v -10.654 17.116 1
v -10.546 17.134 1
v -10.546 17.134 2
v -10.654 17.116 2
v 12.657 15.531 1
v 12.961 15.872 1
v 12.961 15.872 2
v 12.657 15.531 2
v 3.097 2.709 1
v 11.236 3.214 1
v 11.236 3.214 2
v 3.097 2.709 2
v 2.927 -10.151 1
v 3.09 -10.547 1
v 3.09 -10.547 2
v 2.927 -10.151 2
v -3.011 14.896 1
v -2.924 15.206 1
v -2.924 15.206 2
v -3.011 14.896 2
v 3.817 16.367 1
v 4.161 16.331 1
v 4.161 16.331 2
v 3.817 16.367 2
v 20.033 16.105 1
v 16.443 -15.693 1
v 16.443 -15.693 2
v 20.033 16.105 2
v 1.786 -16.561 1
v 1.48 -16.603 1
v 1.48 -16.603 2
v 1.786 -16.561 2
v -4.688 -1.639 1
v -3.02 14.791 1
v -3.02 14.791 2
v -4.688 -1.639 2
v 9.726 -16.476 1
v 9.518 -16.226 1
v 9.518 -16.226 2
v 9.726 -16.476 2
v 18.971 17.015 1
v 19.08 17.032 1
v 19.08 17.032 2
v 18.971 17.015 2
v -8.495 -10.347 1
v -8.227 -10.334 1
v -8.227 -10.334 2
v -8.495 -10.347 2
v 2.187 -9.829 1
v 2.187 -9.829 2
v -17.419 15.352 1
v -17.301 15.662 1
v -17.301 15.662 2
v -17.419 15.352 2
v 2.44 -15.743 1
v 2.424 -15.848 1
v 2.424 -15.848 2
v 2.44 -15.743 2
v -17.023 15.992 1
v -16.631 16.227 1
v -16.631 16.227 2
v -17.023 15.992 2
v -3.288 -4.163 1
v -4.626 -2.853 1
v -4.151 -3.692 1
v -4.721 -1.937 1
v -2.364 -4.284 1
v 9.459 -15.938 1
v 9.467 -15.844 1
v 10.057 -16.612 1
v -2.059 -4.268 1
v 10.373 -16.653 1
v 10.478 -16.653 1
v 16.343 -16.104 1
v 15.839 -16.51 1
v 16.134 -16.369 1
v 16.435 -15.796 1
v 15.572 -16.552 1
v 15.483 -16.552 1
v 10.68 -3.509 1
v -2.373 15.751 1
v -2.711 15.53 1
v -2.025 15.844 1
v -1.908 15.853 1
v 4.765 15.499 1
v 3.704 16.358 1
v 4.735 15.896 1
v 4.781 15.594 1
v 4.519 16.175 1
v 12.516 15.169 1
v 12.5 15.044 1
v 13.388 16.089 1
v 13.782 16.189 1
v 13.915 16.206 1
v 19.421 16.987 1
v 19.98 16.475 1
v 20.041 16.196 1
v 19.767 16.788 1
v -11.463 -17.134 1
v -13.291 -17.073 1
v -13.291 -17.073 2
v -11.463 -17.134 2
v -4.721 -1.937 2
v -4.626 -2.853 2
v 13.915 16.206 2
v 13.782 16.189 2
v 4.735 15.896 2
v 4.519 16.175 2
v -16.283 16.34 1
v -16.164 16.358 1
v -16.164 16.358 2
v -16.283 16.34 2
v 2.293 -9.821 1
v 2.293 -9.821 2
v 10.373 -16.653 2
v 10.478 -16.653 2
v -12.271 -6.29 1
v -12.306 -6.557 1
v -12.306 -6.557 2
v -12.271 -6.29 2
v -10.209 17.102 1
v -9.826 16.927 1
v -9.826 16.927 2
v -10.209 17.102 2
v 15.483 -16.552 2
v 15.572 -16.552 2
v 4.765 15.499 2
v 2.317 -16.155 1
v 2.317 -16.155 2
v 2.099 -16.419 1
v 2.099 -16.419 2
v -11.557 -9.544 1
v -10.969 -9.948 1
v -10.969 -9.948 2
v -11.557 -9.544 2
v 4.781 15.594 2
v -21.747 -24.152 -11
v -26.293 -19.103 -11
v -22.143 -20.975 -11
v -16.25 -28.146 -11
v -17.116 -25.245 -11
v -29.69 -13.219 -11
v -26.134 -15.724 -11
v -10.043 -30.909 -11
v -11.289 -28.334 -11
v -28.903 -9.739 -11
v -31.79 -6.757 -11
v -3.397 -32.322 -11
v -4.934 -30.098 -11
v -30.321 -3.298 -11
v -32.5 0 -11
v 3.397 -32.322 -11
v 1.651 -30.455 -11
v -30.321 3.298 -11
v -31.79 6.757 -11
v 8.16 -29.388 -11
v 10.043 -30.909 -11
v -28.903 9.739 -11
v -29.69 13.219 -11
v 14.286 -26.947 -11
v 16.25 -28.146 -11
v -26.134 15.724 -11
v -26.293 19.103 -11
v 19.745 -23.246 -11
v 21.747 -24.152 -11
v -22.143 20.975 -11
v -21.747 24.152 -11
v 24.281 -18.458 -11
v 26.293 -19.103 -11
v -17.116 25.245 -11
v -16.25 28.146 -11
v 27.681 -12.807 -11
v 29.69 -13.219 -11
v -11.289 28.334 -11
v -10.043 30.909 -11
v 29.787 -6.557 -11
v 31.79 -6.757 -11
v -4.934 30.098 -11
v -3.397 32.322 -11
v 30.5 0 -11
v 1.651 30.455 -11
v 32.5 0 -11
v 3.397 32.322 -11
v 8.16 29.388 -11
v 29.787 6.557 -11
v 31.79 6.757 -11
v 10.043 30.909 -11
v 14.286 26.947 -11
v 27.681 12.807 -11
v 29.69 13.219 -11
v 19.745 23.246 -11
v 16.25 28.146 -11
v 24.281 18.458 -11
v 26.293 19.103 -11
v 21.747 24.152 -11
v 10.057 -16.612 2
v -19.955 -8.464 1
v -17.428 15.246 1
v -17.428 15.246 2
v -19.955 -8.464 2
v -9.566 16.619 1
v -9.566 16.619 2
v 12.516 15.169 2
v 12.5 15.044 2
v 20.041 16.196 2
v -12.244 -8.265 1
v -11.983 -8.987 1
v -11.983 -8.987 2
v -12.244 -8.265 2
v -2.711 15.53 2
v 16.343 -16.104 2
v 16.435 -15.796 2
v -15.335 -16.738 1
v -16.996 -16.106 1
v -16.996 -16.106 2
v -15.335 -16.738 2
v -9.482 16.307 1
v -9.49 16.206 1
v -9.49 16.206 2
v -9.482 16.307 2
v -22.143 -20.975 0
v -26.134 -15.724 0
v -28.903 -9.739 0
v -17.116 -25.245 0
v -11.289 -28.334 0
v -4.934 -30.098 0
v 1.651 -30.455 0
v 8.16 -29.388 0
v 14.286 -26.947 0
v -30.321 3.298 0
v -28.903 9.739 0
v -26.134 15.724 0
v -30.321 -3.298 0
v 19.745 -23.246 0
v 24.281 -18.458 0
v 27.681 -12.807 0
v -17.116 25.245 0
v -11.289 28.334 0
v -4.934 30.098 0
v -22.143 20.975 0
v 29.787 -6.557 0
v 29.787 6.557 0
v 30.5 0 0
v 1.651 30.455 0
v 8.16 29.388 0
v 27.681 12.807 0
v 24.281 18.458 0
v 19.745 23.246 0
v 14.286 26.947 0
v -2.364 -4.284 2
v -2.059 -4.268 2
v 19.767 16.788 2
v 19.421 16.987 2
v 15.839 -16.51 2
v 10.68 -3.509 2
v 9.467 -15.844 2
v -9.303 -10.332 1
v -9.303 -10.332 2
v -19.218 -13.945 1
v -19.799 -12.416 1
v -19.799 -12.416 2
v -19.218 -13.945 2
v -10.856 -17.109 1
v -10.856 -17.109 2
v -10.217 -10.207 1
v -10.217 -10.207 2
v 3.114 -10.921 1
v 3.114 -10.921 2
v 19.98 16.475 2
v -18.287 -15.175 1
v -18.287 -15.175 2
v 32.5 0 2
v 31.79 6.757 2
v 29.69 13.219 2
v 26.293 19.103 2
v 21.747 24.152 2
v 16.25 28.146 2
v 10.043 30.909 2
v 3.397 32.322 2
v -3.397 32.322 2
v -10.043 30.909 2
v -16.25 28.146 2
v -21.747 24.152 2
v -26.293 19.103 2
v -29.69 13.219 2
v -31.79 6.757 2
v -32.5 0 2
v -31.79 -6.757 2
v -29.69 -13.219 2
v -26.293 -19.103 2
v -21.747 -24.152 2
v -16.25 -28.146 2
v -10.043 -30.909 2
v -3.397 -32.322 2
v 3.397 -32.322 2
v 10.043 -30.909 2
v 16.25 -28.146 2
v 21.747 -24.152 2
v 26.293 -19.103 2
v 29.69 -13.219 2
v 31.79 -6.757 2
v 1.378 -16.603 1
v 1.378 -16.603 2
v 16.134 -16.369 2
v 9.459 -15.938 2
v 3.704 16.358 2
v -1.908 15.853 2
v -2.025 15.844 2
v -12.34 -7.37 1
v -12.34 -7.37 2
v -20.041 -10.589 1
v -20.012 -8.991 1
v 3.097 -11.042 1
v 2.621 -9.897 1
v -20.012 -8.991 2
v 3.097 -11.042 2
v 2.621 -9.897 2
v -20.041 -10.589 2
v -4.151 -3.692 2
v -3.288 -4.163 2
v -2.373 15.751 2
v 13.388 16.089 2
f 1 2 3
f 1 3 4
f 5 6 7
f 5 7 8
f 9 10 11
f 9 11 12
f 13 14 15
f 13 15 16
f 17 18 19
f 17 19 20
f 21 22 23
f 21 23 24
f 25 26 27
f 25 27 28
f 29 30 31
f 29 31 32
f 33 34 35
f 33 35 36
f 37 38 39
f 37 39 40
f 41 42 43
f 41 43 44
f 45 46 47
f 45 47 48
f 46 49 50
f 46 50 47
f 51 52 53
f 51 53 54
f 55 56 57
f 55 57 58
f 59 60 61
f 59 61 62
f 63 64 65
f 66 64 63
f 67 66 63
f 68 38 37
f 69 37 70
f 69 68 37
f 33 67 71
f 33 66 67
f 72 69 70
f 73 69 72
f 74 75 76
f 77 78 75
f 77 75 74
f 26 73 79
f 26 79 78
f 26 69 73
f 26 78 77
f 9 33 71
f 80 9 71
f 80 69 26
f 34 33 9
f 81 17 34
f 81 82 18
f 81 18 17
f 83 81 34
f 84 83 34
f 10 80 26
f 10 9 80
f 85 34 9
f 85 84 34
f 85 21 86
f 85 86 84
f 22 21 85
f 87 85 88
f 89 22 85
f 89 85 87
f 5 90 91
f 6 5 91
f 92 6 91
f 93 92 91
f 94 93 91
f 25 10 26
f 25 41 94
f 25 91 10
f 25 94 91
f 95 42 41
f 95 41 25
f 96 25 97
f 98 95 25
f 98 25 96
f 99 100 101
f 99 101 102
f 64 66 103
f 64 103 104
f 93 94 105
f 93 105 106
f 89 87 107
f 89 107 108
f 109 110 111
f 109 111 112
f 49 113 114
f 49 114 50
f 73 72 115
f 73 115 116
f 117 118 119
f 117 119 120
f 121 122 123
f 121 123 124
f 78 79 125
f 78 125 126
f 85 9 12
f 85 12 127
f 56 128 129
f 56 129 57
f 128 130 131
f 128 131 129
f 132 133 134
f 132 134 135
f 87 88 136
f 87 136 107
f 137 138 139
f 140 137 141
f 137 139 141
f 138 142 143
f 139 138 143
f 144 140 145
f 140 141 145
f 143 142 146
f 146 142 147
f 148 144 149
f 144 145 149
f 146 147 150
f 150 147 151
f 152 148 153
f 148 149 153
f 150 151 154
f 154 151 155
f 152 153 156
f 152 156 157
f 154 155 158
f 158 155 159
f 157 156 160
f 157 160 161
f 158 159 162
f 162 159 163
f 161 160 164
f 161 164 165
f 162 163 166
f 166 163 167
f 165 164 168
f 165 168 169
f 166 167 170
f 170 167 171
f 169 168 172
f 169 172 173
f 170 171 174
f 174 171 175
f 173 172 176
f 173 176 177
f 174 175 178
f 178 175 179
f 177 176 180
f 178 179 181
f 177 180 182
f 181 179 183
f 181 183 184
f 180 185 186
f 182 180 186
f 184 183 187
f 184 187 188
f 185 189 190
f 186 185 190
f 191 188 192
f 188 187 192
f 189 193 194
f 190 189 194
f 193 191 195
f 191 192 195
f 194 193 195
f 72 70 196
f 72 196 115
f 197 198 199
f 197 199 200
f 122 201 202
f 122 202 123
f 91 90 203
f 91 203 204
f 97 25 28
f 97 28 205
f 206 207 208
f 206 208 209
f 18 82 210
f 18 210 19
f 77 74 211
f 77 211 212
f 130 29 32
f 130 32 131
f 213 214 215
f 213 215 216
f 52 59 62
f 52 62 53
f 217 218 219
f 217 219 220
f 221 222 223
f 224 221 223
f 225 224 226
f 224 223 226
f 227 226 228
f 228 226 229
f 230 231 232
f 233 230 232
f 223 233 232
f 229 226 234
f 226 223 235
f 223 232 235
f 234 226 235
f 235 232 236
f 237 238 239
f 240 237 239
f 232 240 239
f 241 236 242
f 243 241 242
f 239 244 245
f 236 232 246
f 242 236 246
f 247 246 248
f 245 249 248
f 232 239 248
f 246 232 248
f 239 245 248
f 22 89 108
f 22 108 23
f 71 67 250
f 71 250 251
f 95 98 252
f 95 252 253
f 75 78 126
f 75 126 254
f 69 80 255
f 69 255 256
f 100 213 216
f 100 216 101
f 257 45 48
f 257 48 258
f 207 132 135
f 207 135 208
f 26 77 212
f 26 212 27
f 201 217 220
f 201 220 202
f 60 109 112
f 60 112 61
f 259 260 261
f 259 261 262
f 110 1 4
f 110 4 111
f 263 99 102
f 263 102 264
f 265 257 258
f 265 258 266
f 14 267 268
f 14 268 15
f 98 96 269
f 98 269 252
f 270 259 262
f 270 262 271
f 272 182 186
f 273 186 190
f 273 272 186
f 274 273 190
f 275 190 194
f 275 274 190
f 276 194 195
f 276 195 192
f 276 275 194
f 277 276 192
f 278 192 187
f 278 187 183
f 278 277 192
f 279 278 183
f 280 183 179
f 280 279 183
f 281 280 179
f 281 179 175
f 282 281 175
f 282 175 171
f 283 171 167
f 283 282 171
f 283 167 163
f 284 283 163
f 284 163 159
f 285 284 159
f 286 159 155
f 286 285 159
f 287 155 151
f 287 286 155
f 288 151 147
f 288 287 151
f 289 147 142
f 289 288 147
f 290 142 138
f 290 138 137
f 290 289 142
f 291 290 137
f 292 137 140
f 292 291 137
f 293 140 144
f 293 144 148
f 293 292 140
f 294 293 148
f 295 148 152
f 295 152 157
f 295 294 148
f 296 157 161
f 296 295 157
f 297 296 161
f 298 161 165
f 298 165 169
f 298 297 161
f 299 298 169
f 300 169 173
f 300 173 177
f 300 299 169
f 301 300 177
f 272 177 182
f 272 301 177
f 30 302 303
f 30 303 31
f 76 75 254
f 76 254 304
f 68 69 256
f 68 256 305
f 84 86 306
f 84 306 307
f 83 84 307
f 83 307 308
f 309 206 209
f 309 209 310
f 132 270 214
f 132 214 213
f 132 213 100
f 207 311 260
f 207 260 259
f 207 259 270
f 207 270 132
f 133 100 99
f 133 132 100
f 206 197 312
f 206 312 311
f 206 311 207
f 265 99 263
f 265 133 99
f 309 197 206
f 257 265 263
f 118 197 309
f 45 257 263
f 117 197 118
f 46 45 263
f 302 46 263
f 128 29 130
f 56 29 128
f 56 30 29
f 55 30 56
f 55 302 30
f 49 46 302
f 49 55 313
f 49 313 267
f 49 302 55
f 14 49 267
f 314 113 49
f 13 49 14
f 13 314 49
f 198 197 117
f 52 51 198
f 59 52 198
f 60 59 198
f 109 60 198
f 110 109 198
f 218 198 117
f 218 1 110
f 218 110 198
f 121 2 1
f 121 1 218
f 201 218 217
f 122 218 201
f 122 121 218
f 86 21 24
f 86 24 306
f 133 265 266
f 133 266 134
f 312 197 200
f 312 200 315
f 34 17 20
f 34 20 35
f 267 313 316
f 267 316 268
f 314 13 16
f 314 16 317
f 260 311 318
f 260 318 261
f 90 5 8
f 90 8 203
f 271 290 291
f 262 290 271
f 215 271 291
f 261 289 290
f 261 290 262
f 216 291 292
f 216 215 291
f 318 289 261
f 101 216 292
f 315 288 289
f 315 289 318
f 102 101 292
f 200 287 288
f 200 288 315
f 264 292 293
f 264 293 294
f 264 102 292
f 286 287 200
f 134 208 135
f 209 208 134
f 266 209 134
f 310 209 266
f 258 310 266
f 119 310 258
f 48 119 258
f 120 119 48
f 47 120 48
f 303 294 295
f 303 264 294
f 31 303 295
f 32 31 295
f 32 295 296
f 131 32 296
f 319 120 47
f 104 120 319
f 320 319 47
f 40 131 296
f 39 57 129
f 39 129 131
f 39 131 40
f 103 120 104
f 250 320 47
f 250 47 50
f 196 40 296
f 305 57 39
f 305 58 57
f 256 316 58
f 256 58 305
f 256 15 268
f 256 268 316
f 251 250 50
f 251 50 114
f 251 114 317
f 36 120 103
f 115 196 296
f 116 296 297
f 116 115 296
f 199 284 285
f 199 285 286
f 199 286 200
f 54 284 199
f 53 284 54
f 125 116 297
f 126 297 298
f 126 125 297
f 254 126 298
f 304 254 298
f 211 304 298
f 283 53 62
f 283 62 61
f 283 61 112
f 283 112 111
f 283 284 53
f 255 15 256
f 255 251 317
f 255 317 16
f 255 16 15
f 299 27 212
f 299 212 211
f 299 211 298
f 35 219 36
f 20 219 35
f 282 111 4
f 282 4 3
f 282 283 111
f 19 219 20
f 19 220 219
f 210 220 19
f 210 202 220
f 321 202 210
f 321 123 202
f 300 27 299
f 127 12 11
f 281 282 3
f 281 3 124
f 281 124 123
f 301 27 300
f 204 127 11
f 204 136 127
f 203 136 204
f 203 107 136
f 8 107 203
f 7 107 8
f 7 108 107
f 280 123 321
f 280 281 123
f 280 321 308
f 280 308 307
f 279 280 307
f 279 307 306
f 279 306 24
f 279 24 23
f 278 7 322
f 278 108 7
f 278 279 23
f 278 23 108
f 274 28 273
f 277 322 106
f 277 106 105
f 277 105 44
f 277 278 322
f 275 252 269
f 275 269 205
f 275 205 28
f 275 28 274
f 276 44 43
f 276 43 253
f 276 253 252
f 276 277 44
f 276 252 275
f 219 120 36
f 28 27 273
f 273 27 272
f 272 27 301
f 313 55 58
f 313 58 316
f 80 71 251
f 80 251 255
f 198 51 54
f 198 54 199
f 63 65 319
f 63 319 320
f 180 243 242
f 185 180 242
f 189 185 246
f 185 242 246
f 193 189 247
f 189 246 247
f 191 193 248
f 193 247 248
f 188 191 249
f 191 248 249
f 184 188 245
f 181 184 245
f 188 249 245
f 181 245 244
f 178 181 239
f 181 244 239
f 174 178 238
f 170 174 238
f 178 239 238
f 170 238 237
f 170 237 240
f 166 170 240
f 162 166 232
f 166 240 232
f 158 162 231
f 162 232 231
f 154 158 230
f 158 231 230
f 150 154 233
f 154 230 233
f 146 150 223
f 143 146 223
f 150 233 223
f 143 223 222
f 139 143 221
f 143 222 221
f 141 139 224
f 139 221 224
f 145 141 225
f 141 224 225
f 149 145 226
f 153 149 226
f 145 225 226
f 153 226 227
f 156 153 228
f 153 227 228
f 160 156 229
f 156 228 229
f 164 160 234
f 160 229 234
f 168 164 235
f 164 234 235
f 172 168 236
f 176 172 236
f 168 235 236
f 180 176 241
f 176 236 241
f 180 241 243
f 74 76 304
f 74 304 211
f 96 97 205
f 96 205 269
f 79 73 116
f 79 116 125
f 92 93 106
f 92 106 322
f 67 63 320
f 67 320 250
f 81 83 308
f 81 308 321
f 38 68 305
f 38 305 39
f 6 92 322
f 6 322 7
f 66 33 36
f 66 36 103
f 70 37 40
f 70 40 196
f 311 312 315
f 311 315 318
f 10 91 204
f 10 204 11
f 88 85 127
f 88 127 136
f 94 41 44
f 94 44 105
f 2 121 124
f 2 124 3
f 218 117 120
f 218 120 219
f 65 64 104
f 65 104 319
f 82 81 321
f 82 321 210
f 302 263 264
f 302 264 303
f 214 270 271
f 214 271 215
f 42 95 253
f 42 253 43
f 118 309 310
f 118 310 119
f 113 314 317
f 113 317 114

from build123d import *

# Parameters (mm, degrees)
F0_R     = 32.5
F1_DEPTH = 2
F2_R     = 32.5
F2_R_2   = 30.5
F3_DEPTH = 11
F5_START = 1
F5_DEPTH = 2


with BuildPart() as f1:
    # F0 (on Top) → F1 (new body)
    with BuildSketch(Plane.XY):
        Circle(F0_R)
    extrude(amount=F1_DEPTH)

    # F2 (on Top) → F3 (join)
    with BuildSketch(Plane.XY):
        Circle(F2_R)
        Circle(F2_R_2, mode=Mode.SUBTRACT)
    extrude(amount=-F3_DEPTH)

    # F4 (on Top) → F5 (cut)
    with BuildSketch(Plane.XY.offset(F5_START)):
        Polygon((2.4237075291, -15.8480604819), (2.4399934727, -15.7433961512), (3.0970268987, -11.0418947956), (3.1142315365, -10.9209111143), (3.0897608623, -10.5466517793), (2.9266508736, -10.1506277423), (2.6207256875, -9.8973353851), (2.2931694276, -9.820766395), (2.1871855179, -9.8289177185), (-8.2267149419, -10.3341410951), (-8.495391252, -10.347278423), (-9.3028399824, -10.3323204102), (-10.2167737285, -10.2068184235), (-10.9685161801, -9.9476297195), (-11.5570651254, -9.5443730532), (-11.9825708962, -8.9865836618), (-12.2435635816, -8.2651915276), (-12.340068237, -7.3698822195), (-12.305633906, -6.5574224295), (-12.2711995751, -6.290082402), (-9.4904206453, 16.2064848687), (-9.4823194323, 16.3074577188), (-9.5656700563, 16.6188115528), (-9.8257440475, 16.9269081981), (-10.2090901038, 17.1022952827), (-10.5461673769, 17.1344495816), (-10.6535710868, 17.1163262495), (-16.1638908625, 16.3583199734), (-16.2830538588, 16.3401131236), (-16.6314978853, 16.2273642835), (-17.0234379088, 15.9915939313), (-17.3011925884, 15.6618662122), (-17.4190109504, 15.3519321784), (-17.4276216211, 15.2458647511), (-19.9550747867, -8.4637130038), (-20.0121674586, -8.991110319), (-20.0411731417, -10.5892457856), (-19.799205779, -12.4161945835), (-19.2178644077, -13.944542694), (-18.2871686674, -15.1747327606), (-16.9962529107, -16.105887848), (-15.3346857818, -16.7384255445), (-13.2911506379, -17.0728219007), (-11.463274794, -17.1344495816), (-10.8556838224, -17.1086175695), (1.3783169873, -16.6029515493), (1.4797909433, -16.6029515493), (1.7857161295, -16.5608085384), (2.0987403167, -16.4194381965), (2.3167214075, -16.1548208447), align=None)
        Polygon((-3.0113711872, 14.8960092761), (-3.0200570238, 14.7909440607), (-4.687821163, -1.6389839538), (-4.7205600855, -1.93705848), (-4.6257675421, -2.8528296145), (-4.1513872371, -3.6924326438), (-3.2878146396, -4.1628041012), (-2.3643598804, -4.2841552602), (-2.0593533885, -4.2678693166), (10.6803468484, -3.5093619345), (9.4668352583, -15.8444441673), (9.4587340453, -15.9377751516), (9.5180315834, -16.2264121822), (9.7255729669, -16.476079873), (10.0568040038, -16.6120132154), (10.3725842737, -16.6532458838), (10.4782341128, -16.6532458838), (15.4827792953, -16.5521978678), (15.5716420848, -16.5521978678), (15.8388985947, -16.5100632086), (16.1335488968, -16.3686845149), (16.3428441511, -16.1040671631), (16.4352982, -15.7964048096), (16.4433994129, -15.6926508214), (20.0325708227, 16.1054285009), (20.0411731417, 16.1955440553), (19.9804558033, 16.4750776611), (19.7670681837, 16.7878512953), (19.4208039681, 16.9872079482), (19.0796343298, 17.0319734136), (18.9708108197, 17.0152698817), (13.9154869003, 16.2064848687), (13.7822762336, 16.1888626426), (13.3884904699, 16.0890590397), (12.9612976424, 15.8715790548), (12.6567922565, 15.5313281107), (12.5163155535, 15.1688614692), (12.4999460922, 15.0438355331), (11.2363239065, 3.2143942653), (3.0970268987, 2.7086948381), (4.7653756615, 15.4986727059), (4.7811604991, 15.5943004258), (4.7345576452, 15.896049729), (4.5189150488, 16.1752492641), (4.1609583609, 16.3305921105), (3.8165315338, 16.3668387746), (3.703699176, 16.3583199734), (-1.9076853192, 15.8525370285), (-2.0253617012, 15.8444358155), (-2.3728786817, 15.7505619664), (-2.7105405783, 15.5304094164), (-2.9243457862, 15.2060268276), align=None)
    extrude(amount=F5_DEPTH, mode=Mode.SUBTRACT)


solid = f1.part
